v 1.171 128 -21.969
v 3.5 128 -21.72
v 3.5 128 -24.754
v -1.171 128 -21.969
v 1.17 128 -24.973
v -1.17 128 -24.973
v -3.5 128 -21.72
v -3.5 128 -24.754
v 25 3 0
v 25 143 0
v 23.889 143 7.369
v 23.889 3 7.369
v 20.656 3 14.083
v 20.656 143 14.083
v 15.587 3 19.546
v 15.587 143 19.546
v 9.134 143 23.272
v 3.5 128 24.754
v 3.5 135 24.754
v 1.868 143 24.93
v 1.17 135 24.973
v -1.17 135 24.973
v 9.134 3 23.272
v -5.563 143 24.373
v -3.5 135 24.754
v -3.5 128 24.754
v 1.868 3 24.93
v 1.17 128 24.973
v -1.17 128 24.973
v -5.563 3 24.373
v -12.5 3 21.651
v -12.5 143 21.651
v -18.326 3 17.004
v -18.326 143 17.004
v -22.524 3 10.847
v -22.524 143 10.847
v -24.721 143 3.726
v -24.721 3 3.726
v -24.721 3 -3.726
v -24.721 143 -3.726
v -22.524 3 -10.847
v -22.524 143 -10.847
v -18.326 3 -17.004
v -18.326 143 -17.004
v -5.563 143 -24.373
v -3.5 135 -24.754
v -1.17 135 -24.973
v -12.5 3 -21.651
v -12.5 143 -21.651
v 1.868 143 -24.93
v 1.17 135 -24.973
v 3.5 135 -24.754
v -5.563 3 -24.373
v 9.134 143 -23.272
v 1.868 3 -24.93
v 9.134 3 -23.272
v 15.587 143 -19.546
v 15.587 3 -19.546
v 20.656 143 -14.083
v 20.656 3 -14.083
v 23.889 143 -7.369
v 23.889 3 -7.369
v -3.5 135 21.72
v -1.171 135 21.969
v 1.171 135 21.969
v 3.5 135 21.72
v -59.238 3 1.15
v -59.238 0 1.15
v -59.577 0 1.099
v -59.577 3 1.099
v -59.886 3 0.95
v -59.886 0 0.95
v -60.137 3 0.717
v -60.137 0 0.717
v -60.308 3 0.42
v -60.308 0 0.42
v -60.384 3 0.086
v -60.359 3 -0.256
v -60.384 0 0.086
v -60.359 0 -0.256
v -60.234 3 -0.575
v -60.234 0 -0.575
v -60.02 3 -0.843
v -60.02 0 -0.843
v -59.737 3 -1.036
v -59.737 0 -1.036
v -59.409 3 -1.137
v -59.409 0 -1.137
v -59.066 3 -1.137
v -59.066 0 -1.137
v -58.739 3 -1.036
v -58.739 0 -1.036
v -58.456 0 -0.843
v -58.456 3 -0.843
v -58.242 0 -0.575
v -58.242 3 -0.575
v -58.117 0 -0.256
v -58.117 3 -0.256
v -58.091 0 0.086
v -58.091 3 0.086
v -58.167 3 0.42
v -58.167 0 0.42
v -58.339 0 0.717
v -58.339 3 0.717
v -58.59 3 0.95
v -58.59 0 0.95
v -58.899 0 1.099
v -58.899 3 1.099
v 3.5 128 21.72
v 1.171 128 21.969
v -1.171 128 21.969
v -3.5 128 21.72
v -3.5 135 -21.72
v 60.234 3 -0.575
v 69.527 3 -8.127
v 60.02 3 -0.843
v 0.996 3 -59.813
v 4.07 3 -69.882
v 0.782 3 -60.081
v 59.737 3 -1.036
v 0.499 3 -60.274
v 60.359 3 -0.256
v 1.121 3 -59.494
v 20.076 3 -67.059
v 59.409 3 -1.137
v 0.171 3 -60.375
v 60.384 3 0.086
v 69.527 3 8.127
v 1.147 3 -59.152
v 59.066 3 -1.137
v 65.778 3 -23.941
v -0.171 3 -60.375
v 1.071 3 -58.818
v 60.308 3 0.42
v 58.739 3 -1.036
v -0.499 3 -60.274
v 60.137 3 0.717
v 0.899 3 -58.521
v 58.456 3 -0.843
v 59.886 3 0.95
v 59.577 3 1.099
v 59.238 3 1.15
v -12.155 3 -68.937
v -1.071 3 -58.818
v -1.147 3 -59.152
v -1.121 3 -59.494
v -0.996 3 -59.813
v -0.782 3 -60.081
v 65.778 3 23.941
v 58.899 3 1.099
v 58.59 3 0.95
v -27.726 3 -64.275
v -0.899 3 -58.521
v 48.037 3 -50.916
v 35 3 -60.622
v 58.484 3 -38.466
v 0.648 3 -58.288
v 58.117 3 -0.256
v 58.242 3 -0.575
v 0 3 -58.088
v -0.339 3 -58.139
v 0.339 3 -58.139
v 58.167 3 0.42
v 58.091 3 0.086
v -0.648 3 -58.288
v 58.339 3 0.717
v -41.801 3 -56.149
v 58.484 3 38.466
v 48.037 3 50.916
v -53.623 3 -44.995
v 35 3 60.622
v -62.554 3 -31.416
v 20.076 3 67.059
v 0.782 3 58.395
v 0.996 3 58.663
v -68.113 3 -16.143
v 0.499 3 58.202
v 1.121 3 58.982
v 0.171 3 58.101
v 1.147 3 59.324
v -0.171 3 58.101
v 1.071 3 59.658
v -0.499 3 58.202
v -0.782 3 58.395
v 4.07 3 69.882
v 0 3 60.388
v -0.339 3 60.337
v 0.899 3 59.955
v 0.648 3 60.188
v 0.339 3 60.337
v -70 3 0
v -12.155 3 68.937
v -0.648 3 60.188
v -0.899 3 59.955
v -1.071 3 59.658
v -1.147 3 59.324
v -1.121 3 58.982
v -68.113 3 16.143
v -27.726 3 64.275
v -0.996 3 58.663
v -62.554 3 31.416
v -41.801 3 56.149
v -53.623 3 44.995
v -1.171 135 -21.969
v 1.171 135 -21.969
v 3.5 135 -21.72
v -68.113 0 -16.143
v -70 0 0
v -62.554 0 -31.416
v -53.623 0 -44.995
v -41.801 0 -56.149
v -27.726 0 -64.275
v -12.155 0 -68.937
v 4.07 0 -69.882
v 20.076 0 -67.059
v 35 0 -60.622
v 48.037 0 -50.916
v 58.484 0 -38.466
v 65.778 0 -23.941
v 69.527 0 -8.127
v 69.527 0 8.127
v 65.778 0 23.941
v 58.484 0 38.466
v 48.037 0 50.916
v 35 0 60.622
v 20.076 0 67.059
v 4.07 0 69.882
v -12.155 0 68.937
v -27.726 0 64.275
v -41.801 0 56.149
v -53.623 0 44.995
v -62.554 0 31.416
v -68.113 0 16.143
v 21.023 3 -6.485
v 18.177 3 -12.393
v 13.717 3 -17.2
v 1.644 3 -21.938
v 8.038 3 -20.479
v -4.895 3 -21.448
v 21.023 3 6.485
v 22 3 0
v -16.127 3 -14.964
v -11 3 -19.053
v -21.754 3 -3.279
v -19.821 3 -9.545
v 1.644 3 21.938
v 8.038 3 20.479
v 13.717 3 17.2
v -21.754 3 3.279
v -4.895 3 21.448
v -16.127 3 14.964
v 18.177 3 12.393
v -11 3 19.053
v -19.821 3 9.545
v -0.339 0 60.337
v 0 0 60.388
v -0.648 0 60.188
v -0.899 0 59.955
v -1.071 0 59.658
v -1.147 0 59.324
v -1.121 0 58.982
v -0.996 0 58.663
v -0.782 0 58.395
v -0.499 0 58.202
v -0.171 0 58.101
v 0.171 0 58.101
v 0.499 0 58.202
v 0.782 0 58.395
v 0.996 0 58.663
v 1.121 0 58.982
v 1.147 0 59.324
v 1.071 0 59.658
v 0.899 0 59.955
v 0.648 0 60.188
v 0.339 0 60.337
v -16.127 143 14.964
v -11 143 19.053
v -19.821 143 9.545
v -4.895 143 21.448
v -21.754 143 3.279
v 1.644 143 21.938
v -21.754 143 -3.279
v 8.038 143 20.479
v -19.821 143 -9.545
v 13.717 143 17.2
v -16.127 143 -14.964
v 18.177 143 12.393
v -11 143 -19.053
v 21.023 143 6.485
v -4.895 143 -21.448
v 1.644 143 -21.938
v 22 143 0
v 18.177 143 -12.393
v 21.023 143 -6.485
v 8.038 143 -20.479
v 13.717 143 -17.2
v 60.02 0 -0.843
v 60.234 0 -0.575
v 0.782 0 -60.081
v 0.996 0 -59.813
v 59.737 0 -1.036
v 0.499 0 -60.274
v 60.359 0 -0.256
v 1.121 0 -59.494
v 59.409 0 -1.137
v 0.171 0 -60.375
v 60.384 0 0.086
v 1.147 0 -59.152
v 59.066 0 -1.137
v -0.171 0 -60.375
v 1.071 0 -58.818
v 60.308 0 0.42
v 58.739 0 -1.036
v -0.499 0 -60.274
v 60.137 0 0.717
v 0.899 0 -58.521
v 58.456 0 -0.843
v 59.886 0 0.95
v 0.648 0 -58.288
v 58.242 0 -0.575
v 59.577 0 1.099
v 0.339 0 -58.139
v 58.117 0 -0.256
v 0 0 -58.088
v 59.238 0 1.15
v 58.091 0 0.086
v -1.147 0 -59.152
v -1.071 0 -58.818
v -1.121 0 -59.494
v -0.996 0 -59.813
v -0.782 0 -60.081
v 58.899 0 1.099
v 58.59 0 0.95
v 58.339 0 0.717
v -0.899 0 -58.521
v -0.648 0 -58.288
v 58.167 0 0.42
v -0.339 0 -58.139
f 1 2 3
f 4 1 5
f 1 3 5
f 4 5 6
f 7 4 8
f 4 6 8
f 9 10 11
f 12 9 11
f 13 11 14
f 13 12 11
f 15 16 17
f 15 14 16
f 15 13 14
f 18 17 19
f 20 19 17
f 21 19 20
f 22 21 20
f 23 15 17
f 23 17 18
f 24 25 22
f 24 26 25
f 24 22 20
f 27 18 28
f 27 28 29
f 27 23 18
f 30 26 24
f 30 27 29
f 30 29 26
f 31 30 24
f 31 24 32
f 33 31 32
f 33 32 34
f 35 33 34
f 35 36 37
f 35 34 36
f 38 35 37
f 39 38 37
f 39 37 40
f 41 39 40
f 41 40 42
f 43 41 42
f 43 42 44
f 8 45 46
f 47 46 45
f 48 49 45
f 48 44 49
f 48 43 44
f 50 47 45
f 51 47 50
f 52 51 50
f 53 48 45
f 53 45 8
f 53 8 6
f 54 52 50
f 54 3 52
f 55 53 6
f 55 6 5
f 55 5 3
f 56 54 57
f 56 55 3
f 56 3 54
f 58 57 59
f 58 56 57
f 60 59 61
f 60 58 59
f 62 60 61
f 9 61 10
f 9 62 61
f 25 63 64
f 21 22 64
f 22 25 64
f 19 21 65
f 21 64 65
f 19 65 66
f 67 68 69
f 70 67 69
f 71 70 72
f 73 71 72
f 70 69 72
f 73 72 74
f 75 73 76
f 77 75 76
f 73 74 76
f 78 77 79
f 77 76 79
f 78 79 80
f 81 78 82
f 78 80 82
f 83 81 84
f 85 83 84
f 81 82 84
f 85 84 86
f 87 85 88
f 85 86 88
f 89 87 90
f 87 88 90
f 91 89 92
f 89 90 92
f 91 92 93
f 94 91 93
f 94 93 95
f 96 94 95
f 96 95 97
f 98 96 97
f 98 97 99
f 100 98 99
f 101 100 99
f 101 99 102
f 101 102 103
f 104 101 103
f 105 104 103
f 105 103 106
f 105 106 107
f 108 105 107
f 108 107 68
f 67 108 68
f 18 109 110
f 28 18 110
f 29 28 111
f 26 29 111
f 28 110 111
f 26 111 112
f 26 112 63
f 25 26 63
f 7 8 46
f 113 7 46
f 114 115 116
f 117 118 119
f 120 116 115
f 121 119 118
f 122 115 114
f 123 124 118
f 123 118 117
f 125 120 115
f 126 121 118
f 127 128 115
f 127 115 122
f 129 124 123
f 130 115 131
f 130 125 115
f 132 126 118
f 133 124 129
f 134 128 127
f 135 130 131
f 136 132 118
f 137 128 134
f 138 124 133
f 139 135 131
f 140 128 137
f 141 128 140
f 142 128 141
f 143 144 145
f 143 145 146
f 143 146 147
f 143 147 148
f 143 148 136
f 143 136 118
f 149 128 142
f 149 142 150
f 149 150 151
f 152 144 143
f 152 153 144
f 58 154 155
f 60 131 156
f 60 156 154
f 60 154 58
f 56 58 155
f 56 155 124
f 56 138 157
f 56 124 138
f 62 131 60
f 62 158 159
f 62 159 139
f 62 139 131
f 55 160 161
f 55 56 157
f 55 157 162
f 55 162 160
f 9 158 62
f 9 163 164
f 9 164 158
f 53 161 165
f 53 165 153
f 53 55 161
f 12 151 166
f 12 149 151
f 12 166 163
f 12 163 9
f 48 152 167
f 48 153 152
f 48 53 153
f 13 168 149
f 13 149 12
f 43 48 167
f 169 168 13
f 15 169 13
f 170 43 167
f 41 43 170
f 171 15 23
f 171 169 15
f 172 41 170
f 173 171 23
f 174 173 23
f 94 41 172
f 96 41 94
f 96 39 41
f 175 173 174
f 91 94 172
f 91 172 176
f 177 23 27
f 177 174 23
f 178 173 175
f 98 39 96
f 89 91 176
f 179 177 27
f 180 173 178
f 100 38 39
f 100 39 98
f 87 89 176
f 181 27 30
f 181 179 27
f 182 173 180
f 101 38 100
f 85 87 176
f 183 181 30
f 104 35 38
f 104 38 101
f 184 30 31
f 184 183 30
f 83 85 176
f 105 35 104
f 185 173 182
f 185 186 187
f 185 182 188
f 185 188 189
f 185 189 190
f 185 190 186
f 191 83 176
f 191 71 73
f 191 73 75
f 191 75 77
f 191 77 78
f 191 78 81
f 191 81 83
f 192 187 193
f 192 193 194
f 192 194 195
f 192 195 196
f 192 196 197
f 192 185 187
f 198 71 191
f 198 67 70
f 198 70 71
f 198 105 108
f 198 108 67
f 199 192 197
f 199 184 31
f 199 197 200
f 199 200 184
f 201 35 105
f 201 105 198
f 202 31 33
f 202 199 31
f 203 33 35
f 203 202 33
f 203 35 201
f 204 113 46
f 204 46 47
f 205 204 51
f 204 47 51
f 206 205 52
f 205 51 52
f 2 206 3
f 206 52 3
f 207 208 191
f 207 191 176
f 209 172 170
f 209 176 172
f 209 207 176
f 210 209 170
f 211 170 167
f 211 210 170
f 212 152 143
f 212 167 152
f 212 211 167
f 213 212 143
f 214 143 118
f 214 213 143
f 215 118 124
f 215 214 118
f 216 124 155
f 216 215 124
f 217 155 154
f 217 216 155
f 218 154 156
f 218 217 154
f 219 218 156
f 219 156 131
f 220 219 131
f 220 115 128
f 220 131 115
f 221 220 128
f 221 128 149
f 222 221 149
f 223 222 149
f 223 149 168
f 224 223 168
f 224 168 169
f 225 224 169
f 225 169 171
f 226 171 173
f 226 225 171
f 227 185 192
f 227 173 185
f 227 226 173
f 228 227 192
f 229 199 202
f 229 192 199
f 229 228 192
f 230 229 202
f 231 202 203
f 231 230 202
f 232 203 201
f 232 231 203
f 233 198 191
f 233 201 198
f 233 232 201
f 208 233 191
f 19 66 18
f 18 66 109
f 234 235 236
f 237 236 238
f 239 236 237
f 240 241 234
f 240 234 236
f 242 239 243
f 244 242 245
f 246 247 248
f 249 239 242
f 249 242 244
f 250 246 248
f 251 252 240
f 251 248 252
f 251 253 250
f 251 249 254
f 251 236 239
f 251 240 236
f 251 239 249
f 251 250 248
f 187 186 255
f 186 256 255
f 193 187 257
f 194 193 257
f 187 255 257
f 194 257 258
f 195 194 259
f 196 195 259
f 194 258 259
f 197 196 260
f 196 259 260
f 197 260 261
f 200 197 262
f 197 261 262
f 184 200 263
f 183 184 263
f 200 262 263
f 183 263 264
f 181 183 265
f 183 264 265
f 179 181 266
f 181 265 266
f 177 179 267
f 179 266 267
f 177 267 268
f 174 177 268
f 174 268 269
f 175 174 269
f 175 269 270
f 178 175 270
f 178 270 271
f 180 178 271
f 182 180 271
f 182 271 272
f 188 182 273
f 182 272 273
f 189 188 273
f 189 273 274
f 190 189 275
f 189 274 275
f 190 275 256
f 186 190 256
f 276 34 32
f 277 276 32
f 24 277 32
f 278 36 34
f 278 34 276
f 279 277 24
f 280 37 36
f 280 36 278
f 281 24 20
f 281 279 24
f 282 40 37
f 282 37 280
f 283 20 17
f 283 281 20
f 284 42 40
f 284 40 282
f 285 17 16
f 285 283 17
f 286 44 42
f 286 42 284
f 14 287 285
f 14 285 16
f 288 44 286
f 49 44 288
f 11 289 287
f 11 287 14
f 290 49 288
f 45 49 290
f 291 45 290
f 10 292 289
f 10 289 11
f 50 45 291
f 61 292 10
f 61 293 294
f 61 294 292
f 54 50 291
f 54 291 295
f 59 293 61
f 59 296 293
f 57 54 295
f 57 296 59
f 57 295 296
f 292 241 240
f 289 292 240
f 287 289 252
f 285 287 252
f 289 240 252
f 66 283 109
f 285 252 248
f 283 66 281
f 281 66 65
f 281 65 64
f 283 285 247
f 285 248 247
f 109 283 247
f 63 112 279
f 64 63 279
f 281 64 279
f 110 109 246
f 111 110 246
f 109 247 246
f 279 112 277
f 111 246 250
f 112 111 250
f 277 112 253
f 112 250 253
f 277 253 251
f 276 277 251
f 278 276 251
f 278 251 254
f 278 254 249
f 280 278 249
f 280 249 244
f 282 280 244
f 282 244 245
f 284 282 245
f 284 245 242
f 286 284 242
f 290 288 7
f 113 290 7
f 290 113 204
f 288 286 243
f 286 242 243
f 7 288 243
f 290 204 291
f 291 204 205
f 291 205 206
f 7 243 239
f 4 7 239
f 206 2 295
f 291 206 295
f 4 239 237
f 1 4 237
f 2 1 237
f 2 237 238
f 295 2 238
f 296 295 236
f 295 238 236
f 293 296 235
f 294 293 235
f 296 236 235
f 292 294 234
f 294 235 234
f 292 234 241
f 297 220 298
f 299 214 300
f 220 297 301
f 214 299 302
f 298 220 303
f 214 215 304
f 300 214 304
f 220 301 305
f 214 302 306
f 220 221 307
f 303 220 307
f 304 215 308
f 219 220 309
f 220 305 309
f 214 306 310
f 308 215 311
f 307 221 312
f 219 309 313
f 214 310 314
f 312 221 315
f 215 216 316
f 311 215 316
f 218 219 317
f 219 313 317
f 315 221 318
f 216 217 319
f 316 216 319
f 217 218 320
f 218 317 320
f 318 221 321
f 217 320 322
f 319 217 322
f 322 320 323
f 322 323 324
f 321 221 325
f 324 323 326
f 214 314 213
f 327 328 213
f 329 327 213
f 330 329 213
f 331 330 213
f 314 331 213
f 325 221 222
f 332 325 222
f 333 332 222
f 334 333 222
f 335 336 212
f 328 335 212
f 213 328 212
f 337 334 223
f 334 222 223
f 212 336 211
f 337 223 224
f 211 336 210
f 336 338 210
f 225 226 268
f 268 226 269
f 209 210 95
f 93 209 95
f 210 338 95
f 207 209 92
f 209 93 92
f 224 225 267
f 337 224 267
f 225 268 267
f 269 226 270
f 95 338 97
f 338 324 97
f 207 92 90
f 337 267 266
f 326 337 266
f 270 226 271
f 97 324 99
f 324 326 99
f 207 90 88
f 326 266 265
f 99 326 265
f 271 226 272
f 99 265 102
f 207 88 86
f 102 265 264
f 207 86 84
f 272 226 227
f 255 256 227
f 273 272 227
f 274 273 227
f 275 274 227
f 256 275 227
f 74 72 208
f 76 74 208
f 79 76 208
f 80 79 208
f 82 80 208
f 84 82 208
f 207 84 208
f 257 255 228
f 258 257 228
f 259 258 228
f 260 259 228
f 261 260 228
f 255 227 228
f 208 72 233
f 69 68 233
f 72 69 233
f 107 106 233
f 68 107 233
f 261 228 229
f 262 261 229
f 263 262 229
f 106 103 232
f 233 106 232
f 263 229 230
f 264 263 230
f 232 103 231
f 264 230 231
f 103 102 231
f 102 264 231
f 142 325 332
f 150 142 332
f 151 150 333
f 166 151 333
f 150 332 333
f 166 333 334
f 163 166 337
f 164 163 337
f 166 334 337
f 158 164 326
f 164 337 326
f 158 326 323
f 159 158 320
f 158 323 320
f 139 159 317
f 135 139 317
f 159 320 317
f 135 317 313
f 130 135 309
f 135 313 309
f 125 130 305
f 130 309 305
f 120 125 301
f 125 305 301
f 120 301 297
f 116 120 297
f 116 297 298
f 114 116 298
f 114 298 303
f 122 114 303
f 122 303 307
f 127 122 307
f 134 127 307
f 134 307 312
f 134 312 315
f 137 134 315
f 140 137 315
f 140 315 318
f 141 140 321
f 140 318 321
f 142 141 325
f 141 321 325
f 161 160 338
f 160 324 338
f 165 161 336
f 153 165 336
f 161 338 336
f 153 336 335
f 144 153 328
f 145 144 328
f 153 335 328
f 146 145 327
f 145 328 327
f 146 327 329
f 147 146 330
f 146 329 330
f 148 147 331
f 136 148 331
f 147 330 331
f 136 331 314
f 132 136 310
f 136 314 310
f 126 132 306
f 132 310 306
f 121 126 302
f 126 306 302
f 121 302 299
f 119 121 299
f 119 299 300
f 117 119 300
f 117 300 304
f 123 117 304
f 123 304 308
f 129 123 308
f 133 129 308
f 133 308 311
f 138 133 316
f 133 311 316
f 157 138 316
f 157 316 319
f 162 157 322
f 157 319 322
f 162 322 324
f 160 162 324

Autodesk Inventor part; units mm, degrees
ref_plane "YZ Plane" through (0, 0, 0) normal (1, 0, 0) x (0, 1, 0)
ref_plane "XZ Plane" through (0, 0, 0) normal (0, 1, 0) x (-1, 0, 0)
ref_plane "XY Plane" through (0, 0, 0) normal (0, 0, 1) x (1, 0, 0)
sketch "Sketch1" plane through (0, 0, 0) normal (0, 1, 0) x (-1, 0, 0)
  circle A0 centre (0, 0) radius 70
  dimension "d0" = 140
extrude "Extrusion1" add sketch "Sketch1" along normal blind 3
sketch "Sketch2" plane through (0, 3, 0) normal (0, 1, 0) x (1, 0, 0)
  circle A0 centre (0, 0) radius 25
  dimension "d3" = 50
extrude "Extrusion2" add sketch "Sketch2" along normal blind 140
shell "Shell1" thickness 3 removed faces 1 at (4.976, 143, 4.8639)
sketch "Sketch3" plane through (0, 3, 0) normal (0, 1, 0) x (1, 0, 0)
  circle A0 centre (0, 0) radius 25 projected
  circle A1 centre (0, 0) radius 70 projected
  circle A2 centre (0, 0) radius 70 construction
  line L0 (-70, 0) -> (70, 0) construction
  line L1 (0, 70) -> (0, -70) construction
  line L2 (0, 0) -> (-49.4975, -49.4975) construction
  line L3 (0, 0) -> (49.4975, -49.4975) construction
  point P0 (0, -59.2377)
  point P1 (0, 59.2377)
  point P2 (-59.2377, 0)
  point P3 (59.2377, 0)
  dimension "d14" = 45
  dimension "d15" = 45
hole "Hole1" at (0, 3, 59.2377) at (0, 3, -59.2377) at (59.2377, 3, 0) at (-59.2377, 3, 0) direction (0, -1, 0) diameter 2.3 end through all
sketch "Sketch4" plane through (0, 0, 0) normal (0, 0, 1) x (1, 0, 0)
  line L0 (25, 143) -> (-25, 143) projected
  line L1 (-25, 3) -> (25, 3) projected
  line L2 (70, 3) -> (-70, 3) projected
  line L3 (70, 0) -> (-70, 0) projected
  line L4 (25, 143) -> (-25, 143) construction
  line L5 (0, 143) -> (0, 0) construction
  line L6 (0, 143) -> (0, 0) construction
  line L7 (70, 3) -> (-70, 3) construction
  line L8 (-3.5, 135) -> (3.5, 135)
  line L9 (3.5, 135) -> (3.5, 128)
  line L10 (3.5, 128) -> (-3.5, 128)
  line L11 (-3.5, 128) -> (-3.5, 135)
  line L12 (-3.5, 135) -> (3.5, 128) construction
  line L13 (3.5, 135) -> (-3.5, 128) construction
  point P0 (0, 131.5)
  dimension "d18" = 7
  dimension "d19" = 7
  dimension "d23" = 125
extrude "Extrusion3" cut sketch "Sketch4" along normal mid plane 140
properties part number "bottom card holder"
